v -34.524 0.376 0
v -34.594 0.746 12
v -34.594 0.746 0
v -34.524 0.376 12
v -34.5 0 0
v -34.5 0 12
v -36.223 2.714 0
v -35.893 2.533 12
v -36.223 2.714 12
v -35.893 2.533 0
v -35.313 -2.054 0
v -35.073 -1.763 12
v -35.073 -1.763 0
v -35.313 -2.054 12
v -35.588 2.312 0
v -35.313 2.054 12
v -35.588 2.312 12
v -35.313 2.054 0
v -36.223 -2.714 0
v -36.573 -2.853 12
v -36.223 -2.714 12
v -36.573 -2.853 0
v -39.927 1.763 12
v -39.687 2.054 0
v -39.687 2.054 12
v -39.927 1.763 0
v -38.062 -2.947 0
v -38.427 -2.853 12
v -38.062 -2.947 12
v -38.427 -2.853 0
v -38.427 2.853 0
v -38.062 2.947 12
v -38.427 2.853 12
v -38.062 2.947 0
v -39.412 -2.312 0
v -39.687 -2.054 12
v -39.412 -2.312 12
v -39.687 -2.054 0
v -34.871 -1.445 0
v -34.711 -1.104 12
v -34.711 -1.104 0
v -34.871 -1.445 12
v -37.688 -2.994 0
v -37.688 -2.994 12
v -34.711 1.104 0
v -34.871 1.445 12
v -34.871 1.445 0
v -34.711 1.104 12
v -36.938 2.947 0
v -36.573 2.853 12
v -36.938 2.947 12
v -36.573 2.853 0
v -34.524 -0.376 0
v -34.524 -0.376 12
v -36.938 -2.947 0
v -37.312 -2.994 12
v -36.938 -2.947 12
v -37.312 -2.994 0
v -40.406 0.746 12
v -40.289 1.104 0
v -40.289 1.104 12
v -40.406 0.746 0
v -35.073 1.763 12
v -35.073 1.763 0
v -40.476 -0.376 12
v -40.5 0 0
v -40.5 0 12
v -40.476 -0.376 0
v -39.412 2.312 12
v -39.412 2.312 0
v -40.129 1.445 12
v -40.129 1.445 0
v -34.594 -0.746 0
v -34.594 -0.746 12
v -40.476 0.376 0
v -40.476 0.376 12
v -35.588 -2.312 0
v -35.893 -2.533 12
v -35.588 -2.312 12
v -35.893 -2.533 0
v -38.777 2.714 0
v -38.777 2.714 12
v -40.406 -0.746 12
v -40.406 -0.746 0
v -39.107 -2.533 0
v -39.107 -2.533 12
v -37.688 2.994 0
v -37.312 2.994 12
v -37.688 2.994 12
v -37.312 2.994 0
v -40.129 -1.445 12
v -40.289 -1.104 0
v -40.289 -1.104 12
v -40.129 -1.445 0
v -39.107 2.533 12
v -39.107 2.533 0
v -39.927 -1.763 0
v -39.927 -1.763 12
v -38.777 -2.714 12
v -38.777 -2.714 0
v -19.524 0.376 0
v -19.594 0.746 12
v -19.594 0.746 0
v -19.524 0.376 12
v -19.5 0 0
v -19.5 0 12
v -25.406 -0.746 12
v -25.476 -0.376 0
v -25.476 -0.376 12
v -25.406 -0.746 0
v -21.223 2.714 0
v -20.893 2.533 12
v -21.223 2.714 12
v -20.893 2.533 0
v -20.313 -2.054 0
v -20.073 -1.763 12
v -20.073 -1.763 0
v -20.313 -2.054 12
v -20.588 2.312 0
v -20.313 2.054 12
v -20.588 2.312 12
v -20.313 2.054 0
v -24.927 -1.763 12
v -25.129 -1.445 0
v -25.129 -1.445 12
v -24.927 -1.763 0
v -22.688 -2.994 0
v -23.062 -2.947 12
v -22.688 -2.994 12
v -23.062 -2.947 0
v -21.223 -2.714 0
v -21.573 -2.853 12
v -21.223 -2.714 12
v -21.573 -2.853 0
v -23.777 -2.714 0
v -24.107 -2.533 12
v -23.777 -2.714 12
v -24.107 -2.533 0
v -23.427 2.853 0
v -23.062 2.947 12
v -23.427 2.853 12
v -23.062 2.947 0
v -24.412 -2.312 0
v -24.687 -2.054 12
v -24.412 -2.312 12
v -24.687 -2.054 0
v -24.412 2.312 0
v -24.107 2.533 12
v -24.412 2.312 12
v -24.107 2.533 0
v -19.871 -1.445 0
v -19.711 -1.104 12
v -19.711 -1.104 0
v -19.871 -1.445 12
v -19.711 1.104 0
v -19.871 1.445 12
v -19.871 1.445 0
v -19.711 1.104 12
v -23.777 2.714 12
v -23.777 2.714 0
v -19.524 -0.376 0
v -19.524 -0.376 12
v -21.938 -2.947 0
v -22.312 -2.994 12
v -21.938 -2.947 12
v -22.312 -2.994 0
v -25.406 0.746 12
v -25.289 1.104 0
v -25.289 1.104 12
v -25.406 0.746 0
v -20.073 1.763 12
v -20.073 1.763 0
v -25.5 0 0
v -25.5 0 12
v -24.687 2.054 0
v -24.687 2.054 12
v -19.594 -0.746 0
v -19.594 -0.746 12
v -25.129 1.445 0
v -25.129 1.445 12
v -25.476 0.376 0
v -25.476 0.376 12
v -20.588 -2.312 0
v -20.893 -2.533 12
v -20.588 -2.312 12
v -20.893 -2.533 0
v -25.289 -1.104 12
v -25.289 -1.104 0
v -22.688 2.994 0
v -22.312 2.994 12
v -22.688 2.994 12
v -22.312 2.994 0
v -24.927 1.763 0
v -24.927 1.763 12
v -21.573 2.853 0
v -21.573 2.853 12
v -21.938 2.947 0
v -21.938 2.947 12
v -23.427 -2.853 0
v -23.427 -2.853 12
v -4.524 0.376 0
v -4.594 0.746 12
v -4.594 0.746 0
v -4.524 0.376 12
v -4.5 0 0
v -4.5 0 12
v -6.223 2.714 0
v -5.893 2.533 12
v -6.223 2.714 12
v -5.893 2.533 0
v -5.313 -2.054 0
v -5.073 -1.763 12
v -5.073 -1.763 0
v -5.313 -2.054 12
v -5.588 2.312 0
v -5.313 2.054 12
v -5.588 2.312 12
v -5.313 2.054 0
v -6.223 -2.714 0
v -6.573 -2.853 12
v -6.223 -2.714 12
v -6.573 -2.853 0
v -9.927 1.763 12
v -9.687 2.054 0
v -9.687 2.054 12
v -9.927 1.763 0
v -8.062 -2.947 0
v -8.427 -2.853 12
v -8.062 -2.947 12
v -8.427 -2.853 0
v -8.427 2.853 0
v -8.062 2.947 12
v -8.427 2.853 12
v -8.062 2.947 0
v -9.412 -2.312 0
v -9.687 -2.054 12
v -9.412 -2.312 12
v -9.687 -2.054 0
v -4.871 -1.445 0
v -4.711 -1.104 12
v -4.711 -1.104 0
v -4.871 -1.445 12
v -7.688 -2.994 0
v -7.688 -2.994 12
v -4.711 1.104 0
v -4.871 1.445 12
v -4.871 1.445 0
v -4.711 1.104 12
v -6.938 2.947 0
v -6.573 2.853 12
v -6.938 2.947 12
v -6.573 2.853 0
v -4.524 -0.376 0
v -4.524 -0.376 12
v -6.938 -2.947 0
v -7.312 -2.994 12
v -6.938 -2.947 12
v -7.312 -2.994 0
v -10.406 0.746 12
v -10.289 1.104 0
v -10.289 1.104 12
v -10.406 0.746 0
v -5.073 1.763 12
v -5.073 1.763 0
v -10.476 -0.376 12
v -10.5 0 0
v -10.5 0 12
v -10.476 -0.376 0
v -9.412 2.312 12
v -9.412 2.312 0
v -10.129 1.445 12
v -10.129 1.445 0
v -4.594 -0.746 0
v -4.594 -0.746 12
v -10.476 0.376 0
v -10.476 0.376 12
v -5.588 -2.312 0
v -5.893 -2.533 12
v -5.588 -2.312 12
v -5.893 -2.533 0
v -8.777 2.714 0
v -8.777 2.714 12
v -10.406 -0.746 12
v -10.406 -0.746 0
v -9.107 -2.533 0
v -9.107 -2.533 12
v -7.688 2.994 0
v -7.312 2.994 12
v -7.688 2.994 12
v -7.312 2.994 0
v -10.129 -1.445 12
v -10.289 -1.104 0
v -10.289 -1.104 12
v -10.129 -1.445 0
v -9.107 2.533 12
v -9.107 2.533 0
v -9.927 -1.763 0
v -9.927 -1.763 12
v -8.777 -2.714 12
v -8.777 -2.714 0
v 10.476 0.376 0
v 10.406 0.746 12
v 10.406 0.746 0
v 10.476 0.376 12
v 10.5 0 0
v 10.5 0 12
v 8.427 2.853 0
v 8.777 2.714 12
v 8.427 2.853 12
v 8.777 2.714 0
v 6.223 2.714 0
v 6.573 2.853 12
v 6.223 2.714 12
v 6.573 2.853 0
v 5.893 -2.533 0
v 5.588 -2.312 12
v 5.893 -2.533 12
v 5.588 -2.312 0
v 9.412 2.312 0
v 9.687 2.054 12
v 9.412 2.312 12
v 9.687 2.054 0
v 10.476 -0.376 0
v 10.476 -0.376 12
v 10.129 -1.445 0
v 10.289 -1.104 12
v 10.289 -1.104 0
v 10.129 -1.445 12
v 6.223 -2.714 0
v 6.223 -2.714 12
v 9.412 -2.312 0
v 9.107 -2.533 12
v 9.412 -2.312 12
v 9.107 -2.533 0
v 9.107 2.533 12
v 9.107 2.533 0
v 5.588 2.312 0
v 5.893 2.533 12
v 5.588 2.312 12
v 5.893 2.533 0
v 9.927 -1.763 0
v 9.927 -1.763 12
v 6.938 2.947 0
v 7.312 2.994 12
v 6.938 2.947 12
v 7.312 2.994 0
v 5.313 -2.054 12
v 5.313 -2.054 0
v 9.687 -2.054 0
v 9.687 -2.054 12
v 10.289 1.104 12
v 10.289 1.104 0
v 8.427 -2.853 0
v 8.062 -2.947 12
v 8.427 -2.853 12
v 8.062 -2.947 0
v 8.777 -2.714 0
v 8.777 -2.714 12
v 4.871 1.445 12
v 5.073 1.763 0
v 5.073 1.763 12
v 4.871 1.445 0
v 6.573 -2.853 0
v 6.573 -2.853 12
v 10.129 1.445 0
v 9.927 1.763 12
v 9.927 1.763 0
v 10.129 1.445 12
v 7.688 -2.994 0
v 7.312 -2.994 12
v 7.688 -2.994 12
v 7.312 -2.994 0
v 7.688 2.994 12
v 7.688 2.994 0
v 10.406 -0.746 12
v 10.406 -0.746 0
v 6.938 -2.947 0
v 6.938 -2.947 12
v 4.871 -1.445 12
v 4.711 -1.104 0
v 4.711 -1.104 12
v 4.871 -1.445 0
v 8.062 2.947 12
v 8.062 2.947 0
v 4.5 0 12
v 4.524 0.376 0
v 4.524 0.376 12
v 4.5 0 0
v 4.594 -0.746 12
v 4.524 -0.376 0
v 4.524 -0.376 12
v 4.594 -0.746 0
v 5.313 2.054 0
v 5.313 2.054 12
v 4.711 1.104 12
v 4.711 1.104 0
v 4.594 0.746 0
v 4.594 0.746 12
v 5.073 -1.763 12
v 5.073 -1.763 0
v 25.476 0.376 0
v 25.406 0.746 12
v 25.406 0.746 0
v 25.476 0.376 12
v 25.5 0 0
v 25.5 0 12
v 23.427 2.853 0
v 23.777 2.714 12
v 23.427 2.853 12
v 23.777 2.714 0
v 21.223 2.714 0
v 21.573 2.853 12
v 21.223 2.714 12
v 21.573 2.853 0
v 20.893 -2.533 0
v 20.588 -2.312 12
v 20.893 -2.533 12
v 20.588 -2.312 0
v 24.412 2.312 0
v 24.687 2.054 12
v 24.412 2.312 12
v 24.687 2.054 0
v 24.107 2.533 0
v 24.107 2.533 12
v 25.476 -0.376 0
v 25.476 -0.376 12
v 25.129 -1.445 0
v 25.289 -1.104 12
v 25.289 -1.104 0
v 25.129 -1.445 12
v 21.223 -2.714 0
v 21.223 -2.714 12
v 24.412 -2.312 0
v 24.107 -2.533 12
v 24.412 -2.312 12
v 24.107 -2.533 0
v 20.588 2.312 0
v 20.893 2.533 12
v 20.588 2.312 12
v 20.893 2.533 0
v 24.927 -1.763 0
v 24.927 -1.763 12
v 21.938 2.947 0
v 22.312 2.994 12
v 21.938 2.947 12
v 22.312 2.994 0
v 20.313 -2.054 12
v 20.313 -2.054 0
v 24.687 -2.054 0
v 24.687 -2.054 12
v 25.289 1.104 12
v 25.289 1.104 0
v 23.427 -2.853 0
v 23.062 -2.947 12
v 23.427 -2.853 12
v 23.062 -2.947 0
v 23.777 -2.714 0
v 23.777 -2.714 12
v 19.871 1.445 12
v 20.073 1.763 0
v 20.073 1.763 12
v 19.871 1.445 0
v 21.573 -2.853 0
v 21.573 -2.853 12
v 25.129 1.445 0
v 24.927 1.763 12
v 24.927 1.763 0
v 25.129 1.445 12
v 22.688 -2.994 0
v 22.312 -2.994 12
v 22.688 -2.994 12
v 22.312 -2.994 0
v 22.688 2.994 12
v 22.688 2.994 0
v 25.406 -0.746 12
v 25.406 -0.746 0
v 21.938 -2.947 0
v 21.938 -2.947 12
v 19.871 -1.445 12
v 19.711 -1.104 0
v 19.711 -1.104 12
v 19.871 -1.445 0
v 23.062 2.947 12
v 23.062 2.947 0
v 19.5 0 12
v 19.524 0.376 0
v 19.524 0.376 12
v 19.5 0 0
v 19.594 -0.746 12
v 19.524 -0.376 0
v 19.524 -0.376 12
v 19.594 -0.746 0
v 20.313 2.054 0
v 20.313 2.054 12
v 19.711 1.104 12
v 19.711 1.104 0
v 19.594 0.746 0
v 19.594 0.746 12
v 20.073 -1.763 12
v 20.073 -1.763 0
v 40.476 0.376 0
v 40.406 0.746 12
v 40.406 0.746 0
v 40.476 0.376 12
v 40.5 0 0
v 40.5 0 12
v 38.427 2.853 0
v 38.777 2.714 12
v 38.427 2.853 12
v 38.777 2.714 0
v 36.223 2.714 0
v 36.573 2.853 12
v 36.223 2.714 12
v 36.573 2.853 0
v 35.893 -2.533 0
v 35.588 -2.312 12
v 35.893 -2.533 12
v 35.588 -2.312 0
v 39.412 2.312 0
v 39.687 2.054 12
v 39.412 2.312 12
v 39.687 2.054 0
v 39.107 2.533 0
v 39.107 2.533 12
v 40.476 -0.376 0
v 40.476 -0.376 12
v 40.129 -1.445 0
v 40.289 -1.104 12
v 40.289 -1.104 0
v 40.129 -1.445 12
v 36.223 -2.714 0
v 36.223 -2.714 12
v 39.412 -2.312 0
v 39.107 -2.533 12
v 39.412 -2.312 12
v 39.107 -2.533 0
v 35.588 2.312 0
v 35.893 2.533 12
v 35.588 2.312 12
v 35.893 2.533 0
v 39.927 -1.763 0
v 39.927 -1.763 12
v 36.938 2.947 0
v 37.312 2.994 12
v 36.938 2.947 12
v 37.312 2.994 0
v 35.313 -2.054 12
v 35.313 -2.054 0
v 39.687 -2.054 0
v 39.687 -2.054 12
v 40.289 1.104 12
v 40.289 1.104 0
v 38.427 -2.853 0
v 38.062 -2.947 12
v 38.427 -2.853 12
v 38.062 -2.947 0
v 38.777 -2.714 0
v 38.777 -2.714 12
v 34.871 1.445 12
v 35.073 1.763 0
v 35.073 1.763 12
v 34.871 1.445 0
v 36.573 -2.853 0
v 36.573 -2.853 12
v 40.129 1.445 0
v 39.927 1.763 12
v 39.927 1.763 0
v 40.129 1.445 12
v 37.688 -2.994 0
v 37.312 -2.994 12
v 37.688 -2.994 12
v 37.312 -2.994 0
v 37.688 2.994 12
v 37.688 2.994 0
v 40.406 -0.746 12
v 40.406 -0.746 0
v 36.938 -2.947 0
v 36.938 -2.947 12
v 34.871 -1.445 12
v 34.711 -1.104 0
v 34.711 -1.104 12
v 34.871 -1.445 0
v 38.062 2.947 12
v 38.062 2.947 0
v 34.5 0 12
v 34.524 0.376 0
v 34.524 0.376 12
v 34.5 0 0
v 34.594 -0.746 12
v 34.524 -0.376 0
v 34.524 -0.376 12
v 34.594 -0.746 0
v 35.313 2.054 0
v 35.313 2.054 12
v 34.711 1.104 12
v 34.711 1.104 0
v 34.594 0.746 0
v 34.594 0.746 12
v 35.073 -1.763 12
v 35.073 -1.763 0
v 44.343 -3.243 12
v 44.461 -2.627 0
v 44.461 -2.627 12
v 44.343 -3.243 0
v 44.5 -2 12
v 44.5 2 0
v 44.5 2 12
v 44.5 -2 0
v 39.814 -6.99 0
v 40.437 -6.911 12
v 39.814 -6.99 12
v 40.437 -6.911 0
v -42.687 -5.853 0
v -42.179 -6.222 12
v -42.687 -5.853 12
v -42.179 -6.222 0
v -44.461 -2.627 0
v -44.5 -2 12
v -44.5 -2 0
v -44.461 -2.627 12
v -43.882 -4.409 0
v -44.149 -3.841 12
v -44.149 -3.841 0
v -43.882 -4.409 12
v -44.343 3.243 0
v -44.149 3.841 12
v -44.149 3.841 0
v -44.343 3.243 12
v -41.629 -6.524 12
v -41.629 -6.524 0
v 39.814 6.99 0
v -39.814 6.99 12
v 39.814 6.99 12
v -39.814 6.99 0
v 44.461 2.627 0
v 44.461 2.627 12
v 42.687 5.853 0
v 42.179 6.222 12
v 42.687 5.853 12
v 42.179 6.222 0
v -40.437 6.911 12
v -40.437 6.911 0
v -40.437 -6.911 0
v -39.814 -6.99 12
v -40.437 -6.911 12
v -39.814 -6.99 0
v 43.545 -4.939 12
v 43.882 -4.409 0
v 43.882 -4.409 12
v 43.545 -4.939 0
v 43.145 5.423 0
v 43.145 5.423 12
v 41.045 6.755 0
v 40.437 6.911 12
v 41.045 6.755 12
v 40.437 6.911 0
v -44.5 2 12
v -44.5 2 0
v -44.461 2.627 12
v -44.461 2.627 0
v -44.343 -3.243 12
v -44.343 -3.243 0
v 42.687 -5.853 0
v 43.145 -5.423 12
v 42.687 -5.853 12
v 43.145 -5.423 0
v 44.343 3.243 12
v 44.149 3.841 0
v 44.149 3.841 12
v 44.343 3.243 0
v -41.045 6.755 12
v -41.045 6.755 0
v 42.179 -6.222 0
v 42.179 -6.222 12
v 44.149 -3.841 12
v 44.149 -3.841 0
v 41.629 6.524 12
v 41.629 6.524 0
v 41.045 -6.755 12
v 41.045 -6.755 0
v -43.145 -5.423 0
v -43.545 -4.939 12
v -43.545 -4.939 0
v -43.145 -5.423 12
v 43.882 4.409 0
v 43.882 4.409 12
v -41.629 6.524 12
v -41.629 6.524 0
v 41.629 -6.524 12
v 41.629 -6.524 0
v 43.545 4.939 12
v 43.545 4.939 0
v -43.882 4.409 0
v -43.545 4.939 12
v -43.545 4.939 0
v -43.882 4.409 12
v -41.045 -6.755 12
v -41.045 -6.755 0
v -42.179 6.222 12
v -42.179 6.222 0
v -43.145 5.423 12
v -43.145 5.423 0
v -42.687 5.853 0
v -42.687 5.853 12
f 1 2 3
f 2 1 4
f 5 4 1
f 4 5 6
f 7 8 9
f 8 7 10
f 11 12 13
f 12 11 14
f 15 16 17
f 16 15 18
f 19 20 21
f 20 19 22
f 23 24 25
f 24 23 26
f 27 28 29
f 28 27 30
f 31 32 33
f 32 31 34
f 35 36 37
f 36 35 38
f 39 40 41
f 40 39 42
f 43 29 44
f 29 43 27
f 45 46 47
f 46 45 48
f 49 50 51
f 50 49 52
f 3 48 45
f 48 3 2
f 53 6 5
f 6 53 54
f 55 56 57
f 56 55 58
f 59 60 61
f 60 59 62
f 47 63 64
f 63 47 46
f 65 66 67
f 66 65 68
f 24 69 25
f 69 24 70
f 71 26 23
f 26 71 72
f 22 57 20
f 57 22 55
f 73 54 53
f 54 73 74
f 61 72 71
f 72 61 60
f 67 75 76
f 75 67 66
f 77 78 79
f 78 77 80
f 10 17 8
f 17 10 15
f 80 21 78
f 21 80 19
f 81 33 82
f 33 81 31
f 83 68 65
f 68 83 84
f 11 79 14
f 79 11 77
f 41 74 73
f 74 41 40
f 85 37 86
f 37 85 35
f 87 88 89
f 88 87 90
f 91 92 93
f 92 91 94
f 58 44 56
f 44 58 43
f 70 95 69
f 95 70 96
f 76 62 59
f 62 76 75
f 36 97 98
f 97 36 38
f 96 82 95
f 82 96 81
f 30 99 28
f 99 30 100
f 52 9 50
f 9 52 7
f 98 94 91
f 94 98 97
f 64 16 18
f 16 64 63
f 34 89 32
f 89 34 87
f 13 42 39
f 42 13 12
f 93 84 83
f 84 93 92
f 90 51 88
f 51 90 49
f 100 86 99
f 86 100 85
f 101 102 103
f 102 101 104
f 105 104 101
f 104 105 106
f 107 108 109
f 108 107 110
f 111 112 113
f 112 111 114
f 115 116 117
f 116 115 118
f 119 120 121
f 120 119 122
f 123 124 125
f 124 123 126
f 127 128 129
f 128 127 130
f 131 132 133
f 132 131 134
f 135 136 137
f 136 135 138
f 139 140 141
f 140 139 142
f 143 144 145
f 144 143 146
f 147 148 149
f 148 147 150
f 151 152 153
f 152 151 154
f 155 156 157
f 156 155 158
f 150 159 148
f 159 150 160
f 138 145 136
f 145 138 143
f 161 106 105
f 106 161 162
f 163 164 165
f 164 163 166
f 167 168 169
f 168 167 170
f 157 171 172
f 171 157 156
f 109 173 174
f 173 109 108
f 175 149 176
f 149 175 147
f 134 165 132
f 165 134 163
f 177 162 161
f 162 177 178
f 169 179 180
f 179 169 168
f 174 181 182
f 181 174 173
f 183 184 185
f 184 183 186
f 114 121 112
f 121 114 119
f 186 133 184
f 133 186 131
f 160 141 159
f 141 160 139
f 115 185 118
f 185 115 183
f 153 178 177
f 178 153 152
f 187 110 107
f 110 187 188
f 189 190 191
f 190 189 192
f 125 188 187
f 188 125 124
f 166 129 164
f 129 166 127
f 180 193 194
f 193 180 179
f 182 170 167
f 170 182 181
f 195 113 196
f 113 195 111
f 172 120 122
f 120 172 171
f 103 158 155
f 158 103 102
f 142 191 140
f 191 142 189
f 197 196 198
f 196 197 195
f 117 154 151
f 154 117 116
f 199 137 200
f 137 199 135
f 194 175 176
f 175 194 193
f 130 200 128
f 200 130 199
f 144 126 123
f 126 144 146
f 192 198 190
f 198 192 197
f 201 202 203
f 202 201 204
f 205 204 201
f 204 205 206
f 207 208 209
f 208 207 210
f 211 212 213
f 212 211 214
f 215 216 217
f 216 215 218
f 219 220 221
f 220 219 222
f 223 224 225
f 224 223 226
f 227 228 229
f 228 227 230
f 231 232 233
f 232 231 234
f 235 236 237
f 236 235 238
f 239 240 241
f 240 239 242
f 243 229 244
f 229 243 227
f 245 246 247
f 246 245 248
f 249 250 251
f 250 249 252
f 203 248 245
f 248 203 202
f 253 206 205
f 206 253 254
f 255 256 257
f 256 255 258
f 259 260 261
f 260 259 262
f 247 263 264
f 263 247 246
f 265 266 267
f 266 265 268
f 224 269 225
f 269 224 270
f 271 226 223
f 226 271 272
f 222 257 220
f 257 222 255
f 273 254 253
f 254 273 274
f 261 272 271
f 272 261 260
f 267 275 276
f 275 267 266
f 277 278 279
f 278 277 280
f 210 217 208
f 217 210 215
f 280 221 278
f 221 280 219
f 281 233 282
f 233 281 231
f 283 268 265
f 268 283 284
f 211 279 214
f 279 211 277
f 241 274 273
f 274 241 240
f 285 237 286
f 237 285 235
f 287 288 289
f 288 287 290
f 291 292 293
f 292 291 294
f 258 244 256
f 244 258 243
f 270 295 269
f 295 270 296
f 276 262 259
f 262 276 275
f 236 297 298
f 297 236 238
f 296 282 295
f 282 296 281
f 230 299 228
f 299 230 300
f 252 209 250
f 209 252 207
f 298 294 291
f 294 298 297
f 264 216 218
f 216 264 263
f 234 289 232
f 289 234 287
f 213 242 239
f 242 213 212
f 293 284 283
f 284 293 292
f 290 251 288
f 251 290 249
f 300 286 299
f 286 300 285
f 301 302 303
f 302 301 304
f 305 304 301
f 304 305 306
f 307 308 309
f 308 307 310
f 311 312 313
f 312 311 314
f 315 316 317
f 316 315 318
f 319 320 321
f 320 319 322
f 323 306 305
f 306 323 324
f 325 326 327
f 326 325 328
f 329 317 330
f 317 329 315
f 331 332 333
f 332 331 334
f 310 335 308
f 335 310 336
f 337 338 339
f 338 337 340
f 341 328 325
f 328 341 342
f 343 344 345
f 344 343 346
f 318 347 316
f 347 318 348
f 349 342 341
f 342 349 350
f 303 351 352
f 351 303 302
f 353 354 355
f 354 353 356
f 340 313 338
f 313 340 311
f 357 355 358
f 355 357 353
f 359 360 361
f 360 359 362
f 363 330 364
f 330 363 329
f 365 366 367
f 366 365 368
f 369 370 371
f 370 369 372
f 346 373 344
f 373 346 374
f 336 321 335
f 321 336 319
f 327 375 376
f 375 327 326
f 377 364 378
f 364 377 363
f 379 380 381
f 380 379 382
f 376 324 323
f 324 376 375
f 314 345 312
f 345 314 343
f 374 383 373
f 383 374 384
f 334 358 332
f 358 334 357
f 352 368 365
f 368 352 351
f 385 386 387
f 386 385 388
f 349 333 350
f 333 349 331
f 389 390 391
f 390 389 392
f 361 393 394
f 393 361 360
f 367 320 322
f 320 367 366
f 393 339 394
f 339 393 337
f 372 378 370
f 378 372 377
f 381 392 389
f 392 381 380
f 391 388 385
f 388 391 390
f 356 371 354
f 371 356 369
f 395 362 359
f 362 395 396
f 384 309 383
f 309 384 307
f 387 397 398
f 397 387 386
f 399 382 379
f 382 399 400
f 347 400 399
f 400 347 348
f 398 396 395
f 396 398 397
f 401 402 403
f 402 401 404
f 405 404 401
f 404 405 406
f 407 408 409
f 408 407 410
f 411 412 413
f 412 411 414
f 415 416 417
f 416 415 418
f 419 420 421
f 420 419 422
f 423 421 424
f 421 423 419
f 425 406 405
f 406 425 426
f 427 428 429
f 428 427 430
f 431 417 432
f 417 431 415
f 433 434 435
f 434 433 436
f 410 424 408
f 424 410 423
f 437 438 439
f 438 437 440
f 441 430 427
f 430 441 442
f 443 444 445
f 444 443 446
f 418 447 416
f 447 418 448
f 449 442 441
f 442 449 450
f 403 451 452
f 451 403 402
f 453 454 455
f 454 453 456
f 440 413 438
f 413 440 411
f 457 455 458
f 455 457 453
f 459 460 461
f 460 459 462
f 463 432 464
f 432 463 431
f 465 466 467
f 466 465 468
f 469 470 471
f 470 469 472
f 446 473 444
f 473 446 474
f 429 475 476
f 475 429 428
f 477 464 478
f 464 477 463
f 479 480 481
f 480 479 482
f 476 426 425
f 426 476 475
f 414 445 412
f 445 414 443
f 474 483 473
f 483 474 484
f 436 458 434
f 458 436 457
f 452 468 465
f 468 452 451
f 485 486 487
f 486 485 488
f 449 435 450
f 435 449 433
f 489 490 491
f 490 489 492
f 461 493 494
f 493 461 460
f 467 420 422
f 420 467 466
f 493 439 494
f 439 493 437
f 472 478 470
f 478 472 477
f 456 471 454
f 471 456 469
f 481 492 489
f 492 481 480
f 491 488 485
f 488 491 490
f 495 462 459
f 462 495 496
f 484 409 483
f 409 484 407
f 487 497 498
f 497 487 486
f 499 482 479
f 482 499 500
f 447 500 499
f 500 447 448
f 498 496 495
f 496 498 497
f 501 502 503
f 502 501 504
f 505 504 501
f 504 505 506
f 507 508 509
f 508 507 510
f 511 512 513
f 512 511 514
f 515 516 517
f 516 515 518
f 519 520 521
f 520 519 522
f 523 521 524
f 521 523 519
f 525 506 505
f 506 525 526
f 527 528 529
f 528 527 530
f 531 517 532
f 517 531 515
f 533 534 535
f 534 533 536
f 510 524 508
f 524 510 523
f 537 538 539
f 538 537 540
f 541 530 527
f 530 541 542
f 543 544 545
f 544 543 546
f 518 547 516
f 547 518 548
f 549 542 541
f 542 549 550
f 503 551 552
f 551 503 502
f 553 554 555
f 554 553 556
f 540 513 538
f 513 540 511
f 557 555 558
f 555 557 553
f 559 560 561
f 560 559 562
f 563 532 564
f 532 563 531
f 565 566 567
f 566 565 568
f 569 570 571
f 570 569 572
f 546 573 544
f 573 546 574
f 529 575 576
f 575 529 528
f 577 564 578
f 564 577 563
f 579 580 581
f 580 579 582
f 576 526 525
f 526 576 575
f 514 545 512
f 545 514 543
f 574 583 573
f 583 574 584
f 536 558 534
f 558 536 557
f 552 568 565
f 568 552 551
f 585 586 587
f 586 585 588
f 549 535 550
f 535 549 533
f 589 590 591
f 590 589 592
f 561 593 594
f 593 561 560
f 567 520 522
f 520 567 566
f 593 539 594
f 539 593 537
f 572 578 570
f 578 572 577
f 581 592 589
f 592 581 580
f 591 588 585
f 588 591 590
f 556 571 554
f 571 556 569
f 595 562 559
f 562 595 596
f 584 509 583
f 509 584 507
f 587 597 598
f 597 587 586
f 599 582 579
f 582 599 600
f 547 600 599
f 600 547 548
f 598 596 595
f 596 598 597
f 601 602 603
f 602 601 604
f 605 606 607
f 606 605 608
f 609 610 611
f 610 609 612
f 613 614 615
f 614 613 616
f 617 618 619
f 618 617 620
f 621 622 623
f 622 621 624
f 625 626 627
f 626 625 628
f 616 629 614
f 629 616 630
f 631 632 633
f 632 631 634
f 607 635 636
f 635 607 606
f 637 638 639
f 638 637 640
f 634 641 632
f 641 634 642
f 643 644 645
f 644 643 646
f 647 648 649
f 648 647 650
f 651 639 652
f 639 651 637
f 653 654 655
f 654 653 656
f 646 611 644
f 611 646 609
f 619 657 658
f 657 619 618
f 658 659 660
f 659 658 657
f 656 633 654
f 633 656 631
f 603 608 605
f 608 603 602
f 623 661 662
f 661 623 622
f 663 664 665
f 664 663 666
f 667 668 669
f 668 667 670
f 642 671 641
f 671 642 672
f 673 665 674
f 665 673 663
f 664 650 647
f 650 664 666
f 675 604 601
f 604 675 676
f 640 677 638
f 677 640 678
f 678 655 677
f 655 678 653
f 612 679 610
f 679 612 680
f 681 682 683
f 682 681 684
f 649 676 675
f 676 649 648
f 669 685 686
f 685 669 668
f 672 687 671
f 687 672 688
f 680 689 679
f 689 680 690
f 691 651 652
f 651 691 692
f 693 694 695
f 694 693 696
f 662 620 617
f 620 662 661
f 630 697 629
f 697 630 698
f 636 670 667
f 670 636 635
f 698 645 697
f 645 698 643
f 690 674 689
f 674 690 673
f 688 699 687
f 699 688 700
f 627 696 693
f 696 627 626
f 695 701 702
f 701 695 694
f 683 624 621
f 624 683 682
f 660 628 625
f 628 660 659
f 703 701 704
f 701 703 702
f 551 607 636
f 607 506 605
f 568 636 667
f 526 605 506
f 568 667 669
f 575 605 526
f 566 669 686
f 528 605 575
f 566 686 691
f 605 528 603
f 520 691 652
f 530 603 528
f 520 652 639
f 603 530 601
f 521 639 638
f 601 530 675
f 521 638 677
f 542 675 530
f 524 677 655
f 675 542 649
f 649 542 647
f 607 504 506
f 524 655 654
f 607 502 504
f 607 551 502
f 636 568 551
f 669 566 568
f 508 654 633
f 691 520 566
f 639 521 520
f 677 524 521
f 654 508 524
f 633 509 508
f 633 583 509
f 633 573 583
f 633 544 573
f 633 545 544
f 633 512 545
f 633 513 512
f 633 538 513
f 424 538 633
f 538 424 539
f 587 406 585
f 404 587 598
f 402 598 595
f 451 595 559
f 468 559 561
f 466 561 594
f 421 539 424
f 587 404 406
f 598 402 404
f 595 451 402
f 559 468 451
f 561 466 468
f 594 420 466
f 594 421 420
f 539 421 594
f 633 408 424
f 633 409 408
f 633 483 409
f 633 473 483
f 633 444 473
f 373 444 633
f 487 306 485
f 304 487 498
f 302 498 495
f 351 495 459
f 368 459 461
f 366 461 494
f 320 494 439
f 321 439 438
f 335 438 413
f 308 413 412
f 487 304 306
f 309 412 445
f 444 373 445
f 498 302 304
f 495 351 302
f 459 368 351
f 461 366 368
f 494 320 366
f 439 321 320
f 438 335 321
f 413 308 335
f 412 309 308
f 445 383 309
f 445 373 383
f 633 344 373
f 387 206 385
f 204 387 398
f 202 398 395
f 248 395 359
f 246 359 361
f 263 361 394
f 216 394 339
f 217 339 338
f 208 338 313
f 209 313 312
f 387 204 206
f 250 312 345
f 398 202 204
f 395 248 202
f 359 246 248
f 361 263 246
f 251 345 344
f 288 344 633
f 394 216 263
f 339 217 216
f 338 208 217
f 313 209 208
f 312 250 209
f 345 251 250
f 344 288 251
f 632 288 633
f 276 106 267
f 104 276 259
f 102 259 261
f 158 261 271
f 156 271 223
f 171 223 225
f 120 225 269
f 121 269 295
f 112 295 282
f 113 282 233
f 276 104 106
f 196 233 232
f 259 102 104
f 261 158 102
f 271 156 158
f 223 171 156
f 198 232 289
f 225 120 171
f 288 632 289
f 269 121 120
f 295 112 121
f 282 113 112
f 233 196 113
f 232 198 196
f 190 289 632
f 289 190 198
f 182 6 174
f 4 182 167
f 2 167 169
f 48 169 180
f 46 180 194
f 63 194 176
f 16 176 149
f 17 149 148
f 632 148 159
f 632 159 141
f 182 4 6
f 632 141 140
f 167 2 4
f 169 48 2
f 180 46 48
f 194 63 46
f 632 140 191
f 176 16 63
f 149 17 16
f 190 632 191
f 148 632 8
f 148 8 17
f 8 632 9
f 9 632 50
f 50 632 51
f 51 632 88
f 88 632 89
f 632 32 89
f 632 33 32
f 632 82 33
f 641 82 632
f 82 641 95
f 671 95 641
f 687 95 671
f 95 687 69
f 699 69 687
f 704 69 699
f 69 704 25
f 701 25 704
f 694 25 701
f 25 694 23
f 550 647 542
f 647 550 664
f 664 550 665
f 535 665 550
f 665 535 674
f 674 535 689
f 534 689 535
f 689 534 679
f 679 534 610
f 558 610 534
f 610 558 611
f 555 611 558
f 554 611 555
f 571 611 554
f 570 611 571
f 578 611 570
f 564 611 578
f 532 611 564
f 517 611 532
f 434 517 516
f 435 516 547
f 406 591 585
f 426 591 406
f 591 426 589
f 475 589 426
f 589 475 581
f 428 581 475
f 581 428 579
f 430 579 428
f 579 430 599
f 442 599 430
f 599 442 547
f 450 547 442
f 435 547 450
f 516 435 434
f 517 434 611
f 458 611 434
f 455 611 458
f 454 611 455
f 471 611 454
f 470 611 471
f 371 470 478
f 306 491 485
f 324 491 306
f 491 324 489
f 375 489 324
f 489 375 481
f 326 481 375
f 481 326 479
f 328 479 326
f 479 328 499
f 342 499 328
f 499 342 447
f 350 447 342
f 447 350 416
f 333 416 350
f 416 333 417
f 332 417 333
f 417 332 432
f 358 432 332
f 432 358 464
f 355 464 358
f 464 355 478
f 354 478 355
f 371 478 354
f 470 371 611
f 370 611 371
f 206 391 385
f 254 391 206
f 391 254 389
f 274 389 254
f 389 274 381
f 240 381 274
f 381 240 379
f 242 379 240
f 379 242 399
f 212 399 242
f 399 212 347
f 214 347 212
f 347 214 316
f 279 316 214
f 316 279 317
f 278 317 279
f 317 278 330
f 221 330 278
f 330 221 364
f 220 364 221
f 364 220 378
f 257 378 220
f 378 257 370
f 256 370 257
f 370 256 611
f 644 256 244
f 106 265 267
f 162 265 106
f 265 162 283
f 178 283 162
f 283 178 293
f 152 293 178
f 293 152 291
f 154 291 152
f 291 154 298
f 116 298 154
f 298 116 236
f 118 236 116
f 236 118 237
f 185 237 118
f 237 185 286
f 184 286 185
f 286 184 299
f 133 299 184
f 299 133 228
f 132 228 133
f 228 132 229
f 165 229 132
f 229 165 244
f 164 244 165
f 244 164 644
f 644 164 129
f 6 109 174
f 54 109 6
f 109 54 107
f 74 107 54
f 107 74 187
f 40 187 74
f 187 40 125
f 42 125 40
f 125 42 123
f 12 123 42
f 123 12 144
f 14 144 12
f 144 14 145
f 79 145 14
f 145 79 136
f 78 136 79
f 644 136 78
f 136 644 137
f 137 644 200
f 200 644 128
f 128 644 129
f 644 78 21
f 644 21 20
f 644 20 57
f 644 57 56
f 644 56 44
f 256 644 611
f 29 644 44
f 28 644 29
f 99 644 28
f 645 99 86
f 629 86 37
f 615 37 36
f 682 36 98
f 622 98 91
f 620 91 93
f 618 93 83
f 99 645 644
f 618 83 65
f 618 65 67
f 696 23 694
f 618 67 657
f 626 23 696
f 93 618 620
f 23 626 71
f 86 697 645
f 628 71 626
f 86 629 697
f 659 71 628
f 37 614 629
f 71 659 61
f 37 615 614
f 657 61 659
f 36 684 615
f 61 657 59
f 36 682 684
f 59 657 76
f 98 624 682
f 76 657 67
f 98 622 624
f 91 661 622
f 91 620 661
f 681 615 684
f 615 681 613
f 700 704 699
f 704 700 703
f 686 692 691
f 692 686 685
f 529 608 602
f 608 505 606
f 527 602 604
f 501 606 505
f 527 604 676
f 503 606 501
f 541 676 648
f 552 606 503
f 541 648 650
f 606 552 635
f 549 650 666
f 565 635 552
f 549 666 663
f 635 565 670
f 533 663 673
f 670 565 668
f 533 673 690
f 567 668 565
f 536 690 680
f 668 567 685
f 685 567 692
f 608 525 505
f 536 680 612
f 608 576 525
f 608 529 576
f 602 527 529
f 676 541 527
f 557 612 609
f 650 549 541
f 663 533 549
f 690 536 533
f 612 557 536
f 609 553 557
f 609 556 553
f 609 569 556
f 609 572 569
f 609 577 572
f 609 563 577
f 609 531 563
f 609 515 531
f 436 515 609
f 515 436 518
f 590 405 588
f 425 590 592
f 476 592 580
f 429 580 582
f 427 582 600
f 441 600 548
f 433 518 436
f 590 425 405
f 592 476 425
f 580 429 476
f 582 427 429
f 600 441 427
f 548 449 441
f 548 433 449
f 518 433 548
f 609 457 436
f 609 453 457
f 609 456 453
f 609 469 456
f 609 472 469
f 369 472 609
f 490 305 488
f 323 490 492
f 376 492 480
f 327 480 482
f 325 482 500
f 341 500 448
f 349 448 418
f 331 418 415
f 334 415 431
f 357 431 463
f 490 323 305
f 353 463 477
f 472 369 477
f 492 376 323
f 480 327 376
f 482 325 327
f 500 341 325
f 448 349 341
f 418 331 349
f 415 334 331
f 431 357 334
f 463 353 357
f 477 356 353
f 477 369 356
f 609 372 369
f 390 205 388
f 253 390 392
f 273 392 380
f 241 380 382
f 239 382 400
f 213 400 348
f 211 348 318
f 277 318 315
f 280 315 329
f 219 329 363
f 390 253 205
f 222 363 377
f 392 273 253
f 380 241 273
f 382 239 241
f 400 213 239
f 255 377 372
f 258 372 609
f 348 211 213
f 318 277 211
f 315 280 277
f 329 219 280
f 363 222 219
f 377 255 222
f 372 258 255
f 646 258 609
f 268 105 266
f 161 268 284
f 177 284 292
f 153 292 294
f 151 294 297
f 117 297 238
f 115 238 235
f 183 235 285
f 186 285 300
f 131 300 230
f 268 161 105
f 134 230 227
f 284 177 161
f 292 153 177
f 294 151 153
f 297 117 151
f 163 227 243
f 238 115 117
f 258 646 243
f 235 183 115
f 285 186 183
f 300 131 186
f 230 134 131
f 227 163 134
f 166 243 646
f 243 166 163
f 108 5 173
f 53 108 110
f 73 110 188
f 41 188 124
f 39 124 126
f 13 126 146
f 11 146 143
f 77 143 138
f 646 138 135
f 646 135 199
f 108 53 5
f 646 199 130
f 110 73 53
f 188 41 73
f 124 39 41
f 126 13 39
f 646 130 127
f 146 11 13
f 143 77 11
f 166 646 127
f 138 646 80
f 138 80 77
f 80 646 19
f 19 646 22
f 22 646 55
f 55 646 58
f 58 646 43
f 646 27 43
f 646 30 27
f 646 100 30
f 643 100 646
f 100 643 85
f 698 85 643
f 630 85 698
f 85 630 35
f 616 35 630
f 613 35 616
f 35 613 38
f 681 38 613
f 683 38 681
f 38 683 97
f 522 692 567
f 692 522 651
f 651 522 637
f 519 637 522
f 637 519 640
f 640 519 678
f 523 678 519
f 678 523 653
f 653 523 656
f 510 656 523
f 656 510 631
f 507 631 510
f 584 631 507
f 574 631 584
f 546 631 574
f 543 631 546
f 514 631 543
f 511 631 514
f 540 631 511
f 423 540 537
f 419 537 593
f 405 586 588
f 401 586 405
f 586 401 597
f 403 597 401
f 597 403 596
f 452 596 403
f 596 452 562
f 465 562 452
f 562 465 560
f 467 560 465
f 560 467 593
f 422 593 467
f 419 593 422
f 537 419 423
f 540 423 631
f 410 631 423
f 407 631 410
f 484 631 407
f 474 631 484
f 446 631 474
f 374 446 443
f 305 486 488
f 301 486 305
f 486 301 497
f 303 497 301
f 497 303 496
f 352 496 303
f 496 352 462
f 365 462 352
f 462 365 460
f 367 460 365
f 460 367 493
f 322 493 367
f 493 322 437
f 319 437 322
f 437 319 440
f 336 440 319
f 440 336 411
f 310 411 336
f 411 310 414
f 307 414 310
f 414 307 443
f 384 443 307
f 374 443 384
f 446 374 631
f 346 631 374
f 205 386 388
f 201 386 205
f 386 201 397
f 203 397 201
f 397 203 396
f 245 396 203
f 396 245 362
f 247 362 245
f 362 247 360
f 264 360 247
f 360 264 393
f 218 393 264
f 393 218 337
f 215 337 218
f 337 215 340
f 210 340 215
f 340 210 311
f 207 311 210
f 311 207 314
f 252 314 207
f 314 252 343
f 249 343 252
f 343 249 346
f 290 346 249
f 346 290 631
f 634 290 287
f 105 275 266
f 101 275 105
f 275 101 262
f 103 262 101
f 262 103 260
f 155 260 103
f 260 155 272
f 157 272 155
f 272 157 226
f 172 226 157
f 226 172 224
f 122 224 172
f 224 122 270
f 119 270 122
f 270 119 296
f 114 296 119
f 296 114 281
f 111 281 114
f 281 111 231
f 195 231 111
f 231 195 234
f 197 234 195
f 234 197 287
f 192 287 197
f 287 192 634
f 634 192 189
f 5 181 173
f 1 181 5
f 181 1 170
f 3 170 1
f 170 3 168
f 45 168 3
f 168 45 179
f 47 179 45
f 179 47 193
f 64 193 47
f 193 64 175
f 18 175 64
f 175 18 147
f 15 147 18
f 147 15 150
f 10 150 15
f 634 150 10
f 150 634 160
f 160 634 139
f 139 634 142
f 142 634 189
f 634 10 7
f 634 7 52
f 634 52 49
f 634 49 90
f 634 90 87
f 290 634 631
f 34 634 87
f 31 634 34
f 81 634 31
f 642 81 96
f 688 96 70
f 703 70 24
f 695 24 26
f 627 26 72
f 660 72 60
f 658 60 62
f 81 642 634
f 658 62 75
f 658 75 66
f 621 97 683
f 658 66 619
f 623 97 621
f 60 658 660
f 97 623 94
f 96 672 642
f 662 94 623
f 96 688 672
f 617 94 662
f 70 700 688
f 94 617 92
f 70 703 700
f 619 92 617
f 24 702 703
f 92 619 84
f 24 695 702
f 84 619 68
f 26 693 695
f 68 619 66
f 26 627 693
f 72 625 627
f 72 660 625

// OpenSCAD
$fn = 50;


difference() {
	union() {
		hull() {
			translate(v = [-39.5000000000, 2.0000000000, 0]) {
				cylinder(h = 12, r = 5);
			}
			translate(v = [39.5000000000, 2.0000000000, 0]) {
				cylinder(h = 12, r = 5);
			}
			translate(v = [-39.5000000000, -2.0000000000, 0]) {
				cylinder(h = 12, r = 5);
			}
			translate(v = [39.5000000000, -2.0000000000, 0]) {
				cylinder(h = 12, r = 5);
			}
		}
	}
	union() {
		translate(v = [-37.5000000000, 0.0000000000, 0]) {
			translate(v = [0, 0, -100]) {
				cylinder(h = 200, r = 3.0000000000);
			}
		}
		translate(v = [-22.5000000000, 0.0000000000, 0]) {
			translate(v = [0, 0, -100]) {
				cylinder(h = 200, r = 3.0000000000);
			}
		}
		translate(v = [-7.5000000000, 0.0000000000, 0]) {
			translate(v = [0, 0, -100]) {
				cylinder(h = 200, r = 3.0000000000);
			}
		}
		translate(v = [7.5000000000, 0.0000000000, 0]) {
			translate(v = [0, 0, -100]) {
				cylinder(h = 200, r = 3.0000000000);
			}
		}
		translate(v = [22.5000000000, 0.0000000000, 0]) {
			translate(v = [0, 0, -100]) {
				cylinder(h = 200, r = 3.0000000000);
			}
		}
		translate(v = [37.5000000000, 0.0000000000, 0]) {
			translate(v = [0, 0, -100]) {
				cylinder(h = 200, r = 3.0000000000);
			}
		}
	}
}
